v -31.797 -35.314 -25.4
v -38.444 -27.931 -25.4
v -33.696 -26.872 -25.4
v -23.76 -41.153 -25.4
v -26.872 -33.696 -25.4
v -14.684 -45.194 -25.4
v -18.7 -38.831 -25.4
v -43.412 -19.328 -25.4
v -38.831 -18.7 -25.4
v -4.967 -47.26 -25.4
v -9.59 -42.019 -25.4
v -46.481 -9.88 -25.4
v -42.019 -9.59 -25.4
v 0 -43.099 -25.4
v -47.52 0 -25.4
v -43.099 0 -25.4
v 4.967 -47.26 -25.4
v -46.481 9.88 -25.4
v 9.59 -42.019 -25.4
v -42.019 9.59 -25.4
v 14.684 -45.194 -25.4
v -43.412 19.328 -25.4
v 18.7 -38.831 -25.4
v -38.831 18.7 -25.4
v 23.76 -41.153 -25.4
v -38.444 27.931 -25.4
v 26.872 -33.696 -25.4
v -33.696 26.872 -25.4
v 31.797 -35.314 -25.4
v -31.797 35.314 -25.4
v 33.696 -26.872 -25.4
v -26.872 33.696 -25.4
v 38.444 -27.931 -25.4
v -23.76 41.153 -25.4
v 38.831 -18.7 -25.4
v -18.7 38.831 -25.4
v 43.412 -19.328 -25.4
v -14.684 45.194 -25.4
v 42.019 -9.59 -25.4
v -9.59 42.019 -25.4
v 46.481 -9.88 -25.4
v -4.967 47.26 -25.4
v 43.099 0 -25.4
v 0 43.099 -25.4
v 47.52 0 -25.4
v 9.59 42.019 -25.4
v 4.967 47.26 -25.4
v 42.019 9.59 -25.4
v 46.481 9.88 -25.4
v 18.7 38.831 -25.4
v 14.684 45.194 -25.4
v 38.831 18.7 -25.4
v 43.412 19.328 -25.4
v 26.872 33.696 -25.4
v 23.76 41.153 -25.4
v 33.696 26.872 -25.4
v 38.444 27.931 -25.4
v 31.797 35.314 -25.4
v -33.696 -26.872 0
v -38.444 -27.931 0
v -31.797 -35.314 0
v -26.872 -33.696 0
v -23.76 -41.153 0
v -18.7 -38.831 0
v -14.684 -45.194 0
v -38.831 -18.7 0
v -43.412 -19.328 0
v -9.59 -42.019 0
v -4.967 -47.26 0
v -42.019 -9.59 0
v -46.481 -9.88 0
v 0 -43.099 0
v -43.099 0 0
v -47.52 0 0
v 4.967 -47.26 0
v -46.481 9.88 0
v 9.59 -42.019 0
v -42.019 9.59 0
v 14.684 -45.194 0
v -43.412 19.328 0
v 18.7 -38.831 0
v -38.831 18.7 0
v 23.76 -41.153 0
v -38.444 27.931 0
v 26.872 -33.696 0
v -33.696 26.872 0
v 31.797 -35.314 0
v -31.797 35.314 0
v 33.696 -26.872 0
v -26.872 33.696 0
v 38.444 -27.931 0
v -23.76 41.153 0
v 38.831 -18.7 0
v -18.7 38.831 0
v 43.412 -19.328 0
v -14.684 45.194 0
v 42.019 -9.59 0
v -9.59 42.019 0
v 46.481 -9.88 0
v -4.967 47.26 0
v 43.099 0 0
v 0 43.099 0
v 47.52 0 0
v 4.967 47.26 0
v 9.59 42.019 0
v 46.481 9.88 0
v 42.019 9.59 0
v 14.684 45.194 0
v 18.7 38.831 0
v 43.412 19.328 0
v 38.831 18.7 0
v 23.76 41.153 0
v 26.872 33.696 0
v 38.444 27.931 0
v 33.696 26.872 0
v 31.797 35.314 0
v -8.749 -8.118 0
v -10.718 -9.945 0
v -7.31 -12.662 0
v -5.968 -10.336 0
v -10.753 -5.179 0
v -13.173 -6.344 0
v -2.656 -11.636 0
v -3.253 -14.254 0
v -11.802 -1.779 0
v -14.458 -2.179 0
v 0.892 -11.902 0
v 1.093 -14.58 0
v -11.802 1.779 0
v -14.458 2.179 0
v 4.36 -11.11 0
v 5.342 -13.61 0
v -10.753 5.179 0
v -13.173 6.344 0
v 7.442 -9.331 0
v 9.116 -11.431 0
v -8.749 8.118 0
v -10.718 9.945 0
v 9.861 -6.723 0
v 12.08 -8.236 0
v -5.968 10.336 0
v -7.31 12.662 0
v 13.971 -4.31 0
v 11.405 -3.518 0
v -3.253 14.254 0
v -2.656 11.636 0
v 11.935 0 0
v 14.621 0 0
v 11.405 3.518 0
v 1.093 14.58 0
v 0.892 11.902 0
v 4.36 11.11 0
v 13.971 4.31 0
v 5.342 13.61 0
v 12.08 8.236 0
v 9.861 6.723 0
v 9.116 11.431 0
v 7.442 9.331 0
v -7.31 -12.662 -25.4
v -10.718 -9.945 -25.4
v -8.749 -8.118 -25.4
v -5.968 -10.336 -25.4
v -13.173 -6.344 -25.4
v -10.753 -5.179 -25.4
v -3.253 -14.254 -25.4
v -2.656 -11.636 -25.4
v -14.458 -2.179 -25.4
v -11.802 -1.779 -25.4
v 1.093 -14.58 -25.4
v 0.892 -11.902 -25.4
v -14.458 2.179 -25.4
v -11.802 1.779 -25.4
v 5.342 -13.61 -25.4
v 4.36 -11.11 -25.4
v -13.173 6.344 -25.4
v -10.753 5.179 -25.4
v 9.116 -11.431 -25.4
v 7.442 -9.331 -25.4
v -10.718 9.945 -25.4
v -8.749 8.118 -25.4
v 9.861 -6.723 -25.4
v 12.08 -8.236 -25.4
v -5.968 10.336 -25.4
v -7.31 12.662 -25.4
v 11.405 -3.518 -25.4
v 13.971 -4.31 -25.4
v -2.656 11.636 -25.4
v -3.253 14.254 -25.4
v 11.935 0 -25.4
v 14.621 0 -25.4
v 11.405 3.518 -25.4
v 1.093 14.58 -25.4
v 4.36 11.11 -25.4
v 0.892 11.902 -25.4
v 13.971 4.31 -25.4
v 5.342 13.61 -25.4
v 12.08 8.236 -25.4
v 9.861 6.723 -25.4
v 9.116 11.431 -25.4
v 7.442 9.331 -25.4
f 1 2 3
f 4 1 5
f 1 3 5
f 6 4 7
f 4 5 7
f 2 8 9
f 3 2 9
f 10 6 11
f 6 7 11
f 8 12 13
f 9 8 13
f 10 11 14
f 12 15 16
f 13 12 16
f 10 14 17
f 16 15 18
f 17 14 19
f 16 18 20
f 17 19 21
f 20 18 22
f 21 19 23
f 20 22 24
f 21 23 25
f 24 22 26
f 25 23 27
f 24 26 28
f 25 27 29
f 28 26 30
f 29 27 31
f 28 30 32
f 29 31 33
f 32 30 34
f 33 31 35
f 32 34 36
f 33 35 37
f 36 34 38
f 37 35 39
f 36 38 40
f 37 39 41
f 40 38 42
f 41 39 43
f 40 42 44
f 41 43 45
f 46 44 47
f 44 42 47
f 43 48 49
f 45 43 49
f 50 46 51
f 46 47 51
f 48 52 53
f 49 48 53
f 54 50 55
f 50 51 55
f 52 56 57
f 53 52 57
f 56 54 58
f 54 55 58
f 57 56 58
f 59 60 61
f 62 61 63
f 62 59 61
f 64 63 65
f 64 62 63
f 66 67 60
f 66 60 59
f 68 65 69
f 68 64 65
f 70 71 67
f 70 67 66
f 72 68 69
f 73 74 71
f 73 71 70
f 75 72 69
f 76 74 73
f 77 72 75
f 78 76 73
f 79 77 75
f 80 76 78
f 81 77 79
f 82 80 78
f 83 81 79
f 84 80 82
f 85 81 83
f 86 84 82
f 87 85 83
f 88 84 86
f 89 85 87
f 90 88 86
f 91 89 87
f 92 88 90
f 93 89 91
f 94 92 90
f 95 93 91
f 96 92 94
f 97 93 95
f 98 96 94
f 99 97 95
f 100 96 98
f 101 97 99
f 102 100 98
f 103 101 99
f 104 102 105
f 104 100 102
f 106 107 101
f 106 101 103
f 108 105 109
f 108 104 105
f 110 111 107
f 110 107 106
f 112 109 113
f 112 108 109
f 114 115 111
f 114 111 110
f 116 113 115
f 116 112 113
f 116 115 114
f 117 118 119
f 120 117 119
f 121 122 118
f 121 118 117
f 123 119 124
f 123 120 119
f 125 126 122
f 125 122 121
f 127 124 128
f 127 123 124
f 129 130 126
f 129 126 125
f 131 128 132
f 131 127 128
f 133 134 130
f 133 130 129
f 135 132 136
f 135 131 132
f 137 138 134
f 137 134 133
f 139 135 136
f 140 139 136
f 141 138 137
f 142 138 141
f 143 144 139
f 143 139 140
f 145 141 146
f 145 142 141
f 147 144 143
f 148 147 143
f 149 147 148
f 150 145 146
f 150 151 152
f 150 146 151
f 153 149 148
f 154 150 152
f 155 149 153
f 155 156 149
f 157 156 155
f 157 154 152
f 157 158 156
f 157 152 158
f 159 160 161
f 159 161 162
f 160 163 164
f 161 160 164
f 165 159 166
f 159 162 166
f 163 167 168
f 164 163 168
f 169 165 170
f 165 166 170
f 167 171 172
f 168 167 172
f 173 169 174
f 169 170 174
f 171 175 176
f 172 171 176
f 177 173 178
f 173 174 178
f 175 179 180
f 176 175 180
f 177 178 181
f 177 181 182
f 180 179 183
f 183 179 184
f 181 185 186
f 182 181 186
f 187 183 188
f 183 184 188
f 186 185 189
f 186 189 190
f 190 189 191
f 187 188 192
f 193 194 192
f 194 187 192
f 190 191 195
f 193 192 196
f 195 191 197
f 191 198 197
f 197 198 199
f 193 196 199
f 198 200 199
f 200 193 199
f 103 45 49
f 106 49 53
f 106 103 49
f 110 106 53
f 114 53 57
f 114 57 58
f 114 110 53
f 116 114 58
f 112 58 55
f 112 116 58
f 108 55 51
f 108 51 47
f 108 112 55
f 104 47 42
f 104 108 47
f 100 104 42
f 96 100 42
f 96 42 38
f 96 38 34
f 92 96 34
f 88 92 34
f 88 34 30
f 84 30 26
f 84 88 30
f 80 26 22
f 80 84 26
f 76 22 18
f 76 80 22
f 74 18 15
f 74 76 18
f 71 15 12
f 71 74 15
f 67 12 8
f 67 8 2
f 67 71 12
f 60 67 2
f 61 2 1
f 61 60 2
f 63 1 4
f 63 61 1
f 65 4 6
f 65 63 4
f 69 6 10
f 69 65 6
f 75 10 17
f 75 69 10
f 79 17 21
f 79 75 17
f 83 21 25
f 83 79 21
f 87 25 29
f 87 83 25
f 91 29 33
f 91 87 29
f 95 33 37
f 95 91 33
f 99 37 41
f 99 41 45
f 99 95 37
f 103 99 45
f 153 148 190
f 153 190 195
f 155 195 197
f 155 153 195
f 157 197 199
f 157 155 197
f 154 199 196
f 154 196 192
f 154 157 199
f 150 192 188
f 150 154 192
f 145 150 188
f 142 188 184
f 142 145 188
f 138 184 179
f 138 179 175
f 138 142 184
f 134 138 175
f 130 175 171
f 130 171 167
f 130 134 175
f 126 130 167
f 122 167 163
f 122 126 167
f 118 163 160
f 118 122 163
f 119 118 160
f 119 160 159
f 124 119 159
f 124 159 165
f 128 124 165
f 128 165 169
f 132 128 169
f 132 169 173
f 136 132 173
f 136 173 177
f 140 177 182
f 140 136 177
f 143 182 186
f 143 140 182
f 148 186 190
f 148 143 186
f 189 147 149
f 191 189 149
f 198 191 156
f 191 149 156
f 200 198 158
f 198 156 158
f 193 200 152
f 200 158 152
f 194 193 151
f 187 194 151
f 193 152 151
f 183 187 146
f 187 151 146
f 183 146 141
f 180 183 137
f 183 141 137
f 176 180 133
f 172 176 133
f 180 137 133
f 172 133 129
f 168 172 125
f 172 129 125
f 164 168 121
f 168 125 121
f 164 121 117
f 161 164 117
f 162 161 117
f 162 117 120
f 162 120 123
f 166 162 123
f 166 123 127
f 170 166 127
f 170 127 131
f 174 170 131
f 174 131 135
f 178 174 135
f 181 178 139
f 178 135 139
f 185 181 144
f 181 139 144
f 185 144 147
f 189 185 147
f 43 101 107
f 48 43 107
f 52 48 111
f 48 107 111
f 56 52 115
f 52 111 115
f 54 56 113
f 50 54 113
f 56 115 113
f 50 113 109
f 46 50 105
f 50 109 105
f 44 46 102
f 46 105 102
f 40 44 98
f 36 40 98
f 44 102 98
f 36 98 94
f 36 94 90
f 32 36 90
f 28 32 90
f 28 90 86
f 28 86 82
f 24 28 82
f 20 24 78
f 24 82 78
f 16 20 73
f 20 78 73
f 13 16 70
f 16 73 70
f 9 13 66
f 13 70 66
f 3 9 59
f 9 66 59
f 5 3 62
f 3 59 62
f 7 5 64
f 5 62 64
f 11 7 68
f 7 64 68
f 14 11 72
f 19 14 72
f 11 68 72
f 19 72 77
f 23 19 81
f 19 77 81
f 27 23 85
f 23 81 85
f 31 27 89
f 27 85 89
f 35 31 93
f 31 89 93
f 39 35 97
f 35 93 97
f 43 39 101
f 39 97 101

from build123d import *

# Parameters (mm, degrees)
F0_R     = 47.519886
F1_DEPTH = 25.4
F2_R     = 43.0991
F3_DEPTH = 25.4
F5_R     = 14.620859
F5_R_2   = 11.935264
F6_DEPTH = 25.4


with BuildPart() as f1:
    # F0 (on Top) → F1 (new body)
    with BuildSketch(Plane.XY):
        Circle(F0_R)
    extrude(amount=-F1_DEPTH)

    # F2 (on face) → F3 (cut)
    with BuildSketch(Plane.XY):
        Circle(F2_R)
    extrude(amount=-F3_DEPTH, mode=Mode.SUBTRACT)


with BuildPart() as f6:
    # F5 (on face) → F6 (new body)
    with BuildSketch(Plane.XY):
        Circle(F5_R)
        Circle(F5_R_2, mode=Mode.SUBTRACT)
    extrude(amount=-F6_DEPTH)


solid = Compound([f1.part, f6.part])
